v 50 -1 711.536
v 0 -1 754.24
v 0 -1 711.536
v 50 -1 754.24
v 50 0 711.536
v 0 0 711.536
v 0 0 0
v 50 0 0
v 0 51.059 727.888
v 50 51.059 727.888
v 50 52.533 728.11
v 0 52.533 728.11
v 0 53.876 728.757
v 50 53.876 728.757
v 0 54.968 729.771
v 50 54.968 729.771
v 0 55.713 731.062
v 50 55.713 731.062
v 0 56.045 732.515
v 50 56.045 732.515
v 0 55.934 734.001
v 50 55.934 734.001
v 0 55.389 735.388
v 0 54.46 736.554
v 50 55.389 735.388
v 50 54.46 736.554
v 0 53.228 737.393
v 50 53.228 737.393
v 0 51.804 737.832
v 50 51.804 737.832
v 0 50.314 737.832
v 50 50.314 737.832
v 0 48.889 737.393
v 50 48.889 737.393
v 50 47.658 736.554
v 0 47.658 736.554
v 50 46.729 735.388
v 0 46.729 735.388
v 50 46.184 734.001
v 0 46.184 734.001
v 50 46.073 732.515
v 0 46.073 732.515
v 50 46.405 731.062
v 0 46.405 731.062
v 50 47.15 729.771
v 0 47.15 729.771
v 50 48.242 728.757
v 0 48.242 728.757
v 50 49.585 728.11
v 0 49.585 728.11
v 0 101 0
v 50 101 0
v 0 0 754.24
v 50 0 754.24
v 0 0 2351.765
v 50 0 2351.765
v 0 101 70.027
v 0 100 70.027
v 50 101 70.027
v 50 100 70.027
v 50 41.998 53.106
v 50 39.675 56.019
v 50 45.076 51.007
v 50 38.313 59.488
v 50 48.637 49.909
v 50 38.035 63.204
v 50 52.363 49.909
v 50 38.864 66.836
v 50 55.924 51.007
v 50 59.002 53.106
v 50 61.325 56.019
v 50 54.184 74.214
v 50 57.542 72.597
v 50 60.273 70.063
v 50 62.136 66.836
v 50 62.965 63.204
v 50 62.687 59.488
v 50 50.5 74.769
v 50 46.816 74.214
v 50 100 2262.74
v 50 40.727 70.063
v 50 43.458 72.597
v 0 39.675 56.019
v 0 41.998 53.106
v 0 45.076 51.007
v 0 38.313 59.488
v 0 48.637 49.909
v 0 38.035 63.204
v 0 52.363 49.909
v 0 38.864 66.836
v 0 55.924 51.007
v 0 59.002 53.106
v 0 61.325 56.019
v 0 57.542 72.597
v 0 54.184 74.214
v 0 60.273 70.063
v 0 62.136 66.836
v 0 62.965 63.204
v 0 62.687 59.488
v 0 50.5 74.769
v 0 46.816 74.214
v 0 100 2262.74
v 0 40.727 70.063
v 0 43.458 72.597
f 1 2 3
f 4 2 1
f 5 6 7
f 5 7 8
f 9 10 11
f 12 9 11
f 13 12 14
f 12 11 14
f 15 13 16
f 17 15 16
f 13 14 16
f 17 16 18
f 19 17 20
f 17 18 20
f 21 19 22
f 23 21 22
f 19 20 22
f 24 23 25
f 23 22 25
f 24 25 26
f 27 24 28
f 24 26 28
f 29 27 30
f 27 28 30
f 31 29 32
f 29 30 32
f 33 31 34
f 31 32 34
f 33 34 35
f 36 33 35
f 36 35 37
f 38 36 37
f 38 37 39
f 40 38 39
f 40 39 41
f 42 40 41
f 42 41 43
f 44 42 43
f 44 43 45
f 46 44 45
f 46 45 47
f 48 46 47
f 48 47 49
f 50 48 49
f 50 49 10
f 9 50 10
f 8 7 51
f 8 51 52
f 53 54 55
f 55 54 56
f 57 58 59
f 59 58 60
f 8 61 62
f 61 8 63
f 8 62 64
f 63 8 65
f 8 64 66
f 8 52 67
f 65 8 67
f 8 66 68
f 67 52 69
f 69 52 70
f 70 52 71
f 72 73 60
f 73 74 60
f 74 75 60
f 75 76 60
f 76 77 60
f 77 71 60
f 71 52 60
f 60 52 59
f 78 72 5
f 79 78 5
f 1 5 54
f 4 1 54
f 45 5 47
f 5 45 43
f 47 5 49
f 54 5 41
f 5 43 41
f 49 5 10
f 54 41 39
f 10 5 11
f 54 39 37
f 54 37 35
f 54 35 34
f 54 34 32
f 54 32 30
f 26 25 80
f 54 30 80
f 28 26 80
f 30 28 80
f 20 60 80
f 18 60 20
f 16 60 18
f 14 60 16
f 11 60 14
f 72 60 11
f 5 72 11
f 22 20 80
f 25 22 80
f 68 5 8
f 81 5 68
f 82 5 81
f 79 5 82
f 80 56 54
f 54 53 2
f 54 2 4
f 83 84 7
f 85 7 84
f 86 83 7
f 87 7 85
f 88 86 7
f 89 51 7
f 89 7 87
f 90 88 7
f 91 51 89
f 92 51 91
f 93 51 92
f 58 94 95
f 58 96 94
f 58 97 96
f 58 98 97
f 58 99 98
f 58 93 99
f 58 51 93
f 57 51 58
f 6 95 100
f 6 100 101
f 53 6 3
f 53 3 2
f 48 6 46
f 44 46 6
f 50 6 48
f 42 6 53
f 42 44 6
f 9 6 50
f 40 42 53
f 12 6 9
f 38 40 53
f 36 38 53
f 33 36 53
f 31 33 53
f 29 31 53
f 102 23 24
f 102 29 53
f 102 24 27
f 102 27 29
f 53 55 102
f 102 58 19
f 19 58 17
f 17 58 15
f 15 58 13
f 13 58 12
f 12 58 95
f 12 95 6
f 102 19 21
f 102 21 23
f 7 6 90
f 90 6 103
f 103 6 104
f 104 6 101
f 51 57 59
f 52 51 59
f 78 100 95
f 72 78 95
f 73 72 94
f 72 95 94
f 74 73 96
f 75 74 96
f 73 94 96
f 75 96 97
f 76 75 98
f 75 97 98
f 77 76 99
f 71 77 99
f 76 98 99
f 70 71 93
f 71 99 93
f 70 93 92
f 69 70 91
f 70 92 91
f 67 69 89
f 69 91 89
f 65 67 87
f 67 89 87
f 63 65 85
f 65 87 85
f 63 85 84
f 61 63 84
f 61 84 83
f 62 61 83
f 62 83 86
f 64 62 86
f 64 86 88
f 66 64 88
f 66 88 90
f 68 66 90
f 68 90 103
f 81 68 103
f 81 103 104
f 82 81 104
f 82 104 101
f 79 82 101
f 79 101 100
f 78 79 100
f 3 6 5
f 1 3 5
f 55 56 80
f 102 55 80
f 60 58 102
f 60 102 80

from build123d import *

# Parameters (mm, degrees)
SKETCH1_W           = 50
SKETCH1_H           = 100
BOSS_EXTRUDE1_DEPTH = 2262.74
SKETCH2_W           = 50
SKETCH2_H           = 70.027066898
BOSS_EXTRUDE2_DEPTH = 1
SKETCH3_W           = 50
SKETCH3_H           = 42.703513447
BOSS_EXTRUDE3_DEPTH = 1
SKETCH4_R           = 5
CUT_EXTRUDE1_DEPTH  = 309
SKETCH7_R           = 12.5
CUT_EXTRUDE2_DEPTH  = 100
BOSS_EXTRUDE5_DEPTH = 50


with BuildPart() as part:
    # Sketch1 → Boss-Extrude1 (new body)
    with BuildSketch(Plane.XY):
        with Locations((25, 50)):
            Rectangle(SKETCH1_W, SKETCH1_H)
    extrude(amount=BOSS_EXTRUDE1_DEPTH)

    # Sketch2 → Boss-Extrude2 (add)
    with BuildSketch(Plane(origin=(0, 100, 0), x_dir=(1, 0, 0), z_dir=(0, 1, 0))):
        with Locations((25, -35.013533449)):
            Rectangle(SKETCH2_W, SKETCH2_H)
    extrude(amount=BOSS_EXTRUDE2_DEPTH)

    # Sketch3 → Boss-Extrude3 (add)
    with BuildSketch(Plane.XZ):
        with Locations((25, 732.888243277)):
            Rectangle(SKETCH3_W, SKETCH3_H)
    extrude(amount=BOSS_EXTRUDE3_DEPTH)

    # Sketch4 → Cut-Extrude1 (cut)
    with BuildSketch(Plane(origin=(50, 0, 0), x_dir=(0, 0, -1), z_dir=(1, 0, 0))):
        with Locations((-732.888243277, 51.05890277)):
            Circle(SKETCH4_R)
    extrude(amount=-CUT_EXTRUDE1_DEPTH, mode=Mode.SUBTRACT)

    # Sketch7 → Cut-Extrude2 (cut)
    with BuildSketch(Plane.ZY):
        with Locations((62.269457415, 50.5)):
            Circle(SKETCH7_R)
    extrude(amount=-CUT_EXTRUDE2_DEPTH, mode=Mode.SUBTRACT)

    # Sketch8 → Boss-Extrude5 (add)
    with BuildSketch(Plane(origin=(50, 0, 0), x_dir=(0, 0, -1), z_dir=(1, 0, 0))):
        Polygon((-2262.74, 0), (-2351.764948591, 0), (-2262.74, 100), align=None)
    extrude(amount=-BOSS_EXTRUDE5_DEPTH)


solid = part.part
